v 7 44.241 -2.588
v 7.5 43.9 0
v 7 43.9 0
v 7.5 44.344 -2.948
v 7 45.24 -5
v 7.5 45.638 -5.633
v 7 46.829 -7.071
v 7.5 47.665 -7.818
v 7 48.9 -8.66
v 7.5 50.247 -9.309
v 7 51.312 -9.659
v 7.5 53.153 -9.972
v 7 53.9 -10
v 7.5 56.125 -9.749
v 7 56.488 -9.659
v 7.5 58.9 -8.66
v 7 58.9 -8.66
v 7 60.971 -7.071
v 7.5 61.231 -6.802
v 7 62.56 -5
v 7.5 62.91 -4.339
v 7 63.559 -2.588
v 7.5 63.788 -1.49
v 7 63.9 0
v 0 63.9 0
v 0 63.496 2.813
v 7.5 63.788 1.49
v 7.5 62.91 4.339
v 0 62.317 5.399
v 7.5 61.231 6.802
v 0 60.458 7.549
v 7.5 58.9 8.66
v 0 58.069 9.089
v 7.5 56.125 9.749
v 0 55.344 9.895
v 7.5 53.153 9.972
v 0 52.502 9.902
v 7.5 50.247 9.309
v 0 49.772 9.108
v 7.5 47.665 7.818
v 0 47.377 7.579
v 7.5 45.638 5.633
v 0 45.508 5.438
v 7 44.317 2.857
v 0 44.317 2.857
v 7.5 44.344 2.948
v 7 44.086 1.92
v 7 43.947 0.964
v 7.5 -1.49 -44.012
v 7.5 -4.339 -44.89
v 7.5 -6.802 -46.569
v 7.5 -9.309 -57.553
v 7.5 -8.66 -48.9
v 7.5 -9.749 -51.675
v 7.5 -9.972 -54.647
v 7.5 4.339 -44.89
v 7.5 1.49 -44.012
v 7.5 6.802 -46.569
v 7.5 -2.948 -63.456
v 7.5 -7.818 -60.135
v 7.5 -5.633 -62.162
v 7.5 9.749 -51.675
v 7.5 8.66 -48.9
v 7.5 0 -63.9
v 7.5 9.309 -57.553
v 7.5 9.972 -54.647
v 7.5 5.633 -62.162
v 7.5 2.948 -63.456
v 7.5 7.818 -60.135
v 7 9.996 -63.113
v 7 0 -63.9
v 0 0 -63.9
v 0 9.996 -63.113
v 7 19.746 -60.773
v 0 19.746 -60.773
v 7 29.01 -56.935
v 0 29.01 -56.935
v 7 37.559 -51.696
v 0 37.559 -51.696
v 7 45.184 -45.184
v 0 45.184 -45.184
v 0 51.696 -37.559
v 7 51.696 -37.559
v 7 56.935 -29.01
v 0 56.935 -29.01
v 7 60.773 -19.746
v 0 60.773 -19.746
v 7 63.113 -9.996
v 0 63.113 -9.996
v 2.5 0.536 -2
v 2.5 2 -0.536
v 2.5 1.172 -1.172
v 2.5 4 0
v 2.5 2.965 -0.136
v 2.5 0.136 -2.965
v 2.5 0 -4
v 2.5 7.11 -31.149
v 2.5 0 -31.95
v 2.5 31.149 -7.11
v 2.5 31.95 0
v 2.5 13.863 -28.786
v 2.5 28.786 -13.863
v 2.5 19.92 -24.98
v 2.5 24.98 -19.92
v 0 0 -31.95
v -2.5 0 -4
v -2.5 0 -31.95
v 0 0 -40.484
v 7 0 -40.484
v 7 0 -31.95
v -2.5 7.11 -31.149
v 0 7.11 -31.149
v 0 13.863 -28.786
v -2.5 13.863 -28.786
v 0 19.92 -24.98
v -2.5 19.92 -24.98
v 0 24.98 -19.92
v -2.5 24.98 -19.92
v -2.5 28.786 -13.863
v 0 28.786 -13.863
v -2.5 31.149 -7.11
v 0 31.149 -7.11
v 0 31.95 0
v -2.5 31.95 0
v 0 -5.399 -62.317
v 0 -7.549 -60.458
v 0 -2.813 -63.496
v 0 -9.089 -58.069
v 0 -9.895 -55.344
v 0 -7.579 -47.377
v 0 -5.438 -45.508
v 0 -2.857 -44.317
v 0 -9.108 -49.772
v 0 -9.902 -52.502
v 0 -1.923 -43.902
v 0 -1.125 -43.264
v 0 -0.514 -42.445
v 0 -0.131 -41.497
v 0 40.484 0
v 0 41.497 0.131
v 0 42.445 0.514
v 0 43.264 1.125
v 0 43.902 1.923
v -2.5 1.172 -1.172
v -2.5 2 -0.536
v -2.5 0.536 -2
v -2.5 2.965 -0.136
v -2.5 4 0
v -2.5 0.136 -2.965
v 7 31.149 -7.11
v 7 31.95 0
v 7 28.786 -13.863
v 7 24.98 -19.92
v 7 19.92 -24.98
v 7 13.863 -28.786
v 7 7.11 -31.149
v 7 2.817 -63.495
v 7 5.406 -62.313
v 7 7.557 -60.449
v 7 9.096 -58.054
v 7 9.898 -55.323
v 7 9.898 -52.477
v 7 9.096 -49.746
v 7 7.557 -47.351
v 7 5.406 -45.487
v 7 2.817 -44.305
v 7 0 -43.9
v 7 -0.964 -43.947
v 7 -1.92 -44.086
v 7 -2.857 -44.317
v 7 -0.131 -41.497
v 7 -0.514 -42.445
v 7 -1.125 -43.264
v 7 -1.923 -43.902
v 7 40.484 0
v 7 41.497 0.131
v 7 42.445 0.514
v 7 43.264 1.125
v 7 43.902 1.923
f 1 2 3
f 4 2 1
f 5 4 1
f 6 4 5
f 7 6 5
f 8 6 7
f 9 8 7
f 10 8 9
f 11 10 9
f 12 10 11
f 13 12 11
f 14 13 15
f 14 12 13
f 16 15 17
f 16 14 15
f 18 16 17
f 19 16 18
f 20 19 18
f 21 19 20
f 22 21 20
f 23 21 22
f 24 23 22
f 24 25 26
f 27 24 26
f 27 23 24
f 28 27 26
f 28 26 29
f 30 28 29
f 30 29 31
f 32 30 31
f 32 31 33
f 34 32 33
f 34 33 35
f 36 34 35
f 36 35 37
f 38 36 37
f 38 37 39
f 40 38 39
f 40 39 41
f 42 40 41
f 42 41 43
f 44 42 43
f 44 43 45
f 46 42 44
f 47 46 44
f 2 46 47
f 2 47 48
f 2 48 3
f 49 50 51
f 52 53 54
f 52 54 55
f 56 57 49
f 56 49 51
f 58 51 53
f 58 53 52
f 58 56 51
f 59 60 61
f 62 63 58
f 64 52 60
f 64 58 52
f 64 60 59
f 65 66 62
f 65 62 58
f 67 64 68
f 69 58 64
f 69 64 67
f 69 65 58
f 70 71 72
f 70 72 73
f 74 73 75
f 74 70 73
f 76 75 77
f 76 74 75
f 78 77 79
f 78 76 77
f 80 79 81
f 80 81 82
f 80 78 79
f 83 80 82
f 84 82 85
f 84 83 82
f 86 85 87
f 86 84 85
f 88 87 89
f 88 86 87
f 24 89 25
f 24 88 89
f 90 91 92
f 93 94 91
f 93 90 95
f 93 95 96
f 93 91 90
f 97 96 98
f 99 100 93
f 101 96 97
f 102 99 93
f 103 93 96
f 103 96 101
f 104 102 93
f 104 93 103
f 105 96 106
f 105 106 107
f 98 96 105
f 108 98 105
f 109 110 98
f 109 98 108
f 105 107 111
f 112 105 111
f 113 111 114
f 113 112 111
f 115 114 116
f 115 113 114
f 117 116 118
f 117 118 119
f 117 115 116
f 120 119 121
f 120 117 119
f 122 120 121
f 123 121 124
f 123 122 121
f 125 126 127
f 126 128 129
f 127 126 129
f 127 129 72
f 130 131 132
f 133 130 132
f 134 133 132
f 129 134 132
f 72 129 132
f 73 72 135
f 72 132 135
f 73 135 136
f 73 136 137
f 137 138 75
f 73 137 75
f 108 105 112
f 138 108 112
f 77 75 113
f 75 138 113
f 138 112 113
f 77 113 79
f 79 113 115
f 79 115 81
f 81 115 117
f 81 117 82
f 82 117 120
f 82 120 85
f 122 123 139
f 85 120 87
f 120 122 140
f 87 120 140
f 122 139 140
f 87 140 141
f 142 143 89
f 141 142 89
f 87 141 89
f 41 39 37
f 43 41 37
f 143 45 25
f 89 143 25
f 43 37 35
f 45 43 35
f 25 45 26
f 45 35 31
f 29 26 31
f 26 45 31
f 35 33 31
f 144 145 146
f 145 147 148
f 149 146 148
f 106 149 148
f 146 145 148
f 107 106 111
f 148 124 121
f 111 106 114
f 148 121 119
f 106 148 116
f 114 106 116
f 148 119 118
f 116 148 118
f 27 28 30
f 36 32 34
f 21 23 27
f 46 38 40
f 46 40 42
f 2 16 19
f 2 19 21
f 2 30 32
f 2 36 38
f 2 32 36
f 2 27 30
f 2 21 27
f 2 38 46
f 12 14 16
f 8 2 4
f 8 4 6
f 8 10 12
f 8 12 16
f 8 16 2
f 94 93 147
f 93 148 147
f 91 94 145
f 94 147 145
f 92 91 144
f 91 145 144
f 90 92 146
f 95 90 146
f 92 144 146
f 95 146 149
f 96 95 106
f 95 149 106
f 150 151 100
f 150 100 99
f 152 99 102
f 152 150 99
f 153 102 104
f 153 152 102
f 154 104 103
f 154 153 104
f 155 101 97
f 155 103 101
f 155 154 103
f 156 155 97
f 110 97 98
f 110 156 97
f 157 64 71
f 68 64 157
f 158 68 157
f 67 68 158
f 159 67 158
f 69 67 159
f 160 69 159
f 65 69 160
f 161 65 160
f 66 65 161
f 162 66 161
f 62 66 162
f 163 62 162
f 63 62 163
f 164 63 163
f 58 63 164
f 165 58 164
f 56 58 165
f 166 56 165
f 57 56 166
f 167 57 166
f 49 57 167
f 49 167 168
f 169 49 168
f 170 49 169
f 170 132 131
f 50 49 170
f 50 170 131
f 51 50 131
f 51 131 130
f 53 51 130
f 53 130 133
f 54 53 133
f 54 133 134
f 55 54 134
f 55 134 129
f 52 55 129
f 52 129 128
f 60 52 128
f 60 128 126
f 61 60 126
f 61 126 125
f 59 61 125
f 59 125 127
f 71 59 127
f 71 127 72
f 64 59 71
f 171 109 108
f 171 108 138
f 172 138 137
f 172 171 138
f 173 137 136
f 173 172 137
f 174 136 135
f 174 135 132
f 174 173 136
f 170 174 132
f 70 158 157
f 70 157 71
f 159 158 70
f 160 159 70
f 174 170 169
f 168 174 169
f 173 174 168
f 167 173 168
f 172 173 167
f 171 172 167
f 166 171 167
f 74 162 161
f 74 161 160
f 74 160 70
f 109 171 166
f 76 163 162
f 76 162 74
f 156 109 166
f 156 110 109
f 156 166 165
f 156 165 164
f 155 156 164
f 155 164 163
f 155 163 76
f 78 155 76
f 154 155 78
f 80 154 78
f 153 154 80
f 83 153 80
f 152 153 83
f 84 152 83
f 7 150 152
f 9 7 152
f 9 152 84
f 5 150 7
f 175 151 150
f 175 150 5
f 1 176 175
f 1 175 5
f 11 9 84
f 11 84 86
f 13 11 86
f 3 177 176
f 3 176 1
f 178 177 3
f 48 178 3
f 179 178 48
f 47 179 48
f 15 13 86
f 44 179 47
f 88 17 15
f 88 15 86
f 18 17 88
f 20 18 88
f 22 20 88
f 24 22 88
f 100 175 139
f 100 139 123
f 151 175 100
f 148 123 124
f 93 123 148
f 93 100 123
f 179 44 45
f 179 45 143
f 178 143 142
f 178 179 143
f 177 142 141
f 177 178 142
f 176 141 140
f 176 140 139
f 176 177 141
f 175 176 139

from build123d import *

# Parameters (mm, degrees)
SALIENTE_EXTRUIR1_DEPTH = 2.5
SALIENTE_EXTRUIR2_START = 7
SALIENTE_EXTRUIR2_DEPTH = 7
SALIENTE_EXTRUIR3_START = 7.5
CROQUIS2_4_R            = 10
SALIENTE_EXTRUIR3_DEPTH = 7.5
REDONDEO1_R             = 4
REDONDEO2_R             = 4


with BuildPart() as part:
    # Croquis2 → Saliente-Extruir1 (new, symmetric)
    with BuildSketch(Plane(origin=(0, 0, 0), x_dir=(0, 0, -1), z_dir=(1, 0, 0))):
        with BuildLine():
            ThreePointArc((31.95, 0), (22.592061659, 22.592061659), (0, 31.95))
            Line((0, 31.95), (0, 0))
            Line((0, 0), (31.95, 0))
        make_face()
    extrude(amount=SALIENTE_EXTRUIR1_DEPTH, both=True)

    # Croquis2<3> → Saliente-Extruir2 (add)
    with BuildSketch(Plane(origin=(0, 0, 0), x_dir=(0, 0, -1), z_dir=(1, 0, 0)).offset(SALIENTE_EXTRUIR2_START)):
        with BuildLine():
            ThreePointArc((10, 53.9), (7.071067812, 46.828932188), (0, 43.9))
            Line((0, 43.9), (0, 31.95))
            ThreePointArc((0, 31.95), (22.592061659, 22.592061659), (31.95, 0))
            Line((31.95, 0), (43.9, 0))
            ThreePointArc((43.9, 0), (53.9, 10), (63.9, 0))
            ThreePointArc((63.9, 0), (45.184123318, 45.184123318), (0, 63.9))
            ThreePointArc((0, 63.9), (7.071067812, 60.971067812), (10, 53.9))
        make_face()
    extrude(amount=-SALIENTE_EXTRUIR2_DEPTH)

    # Croquis2<4> → Saliente-Extruir3 (add)
    with BuildSketch(Plane(origin=(0, 0, 0), x_dir=(0, 0, -1), z_dir=(1, 0, 0)).offset(SALIENTE_EXTRUIR3_START)):
        with Locations((0, 53.9)):
            Circle(CROQUIS2_4_R)
        with Locations((53.9, 0)):
            Circle(CROQUIS2_4_R)
    extrude(amount=-SALIENTE_EXTRUIR3_DEPTH)

    # Redondeo1
    redondeo1_edges = [part.edges().sort_by_distance(p)[0] for p in [
        (0, 0, 0),
    ]]
    fillet(redondeo1_edges, radius=REDONDEO1_R)

    # Redondeo2
    redondeo2_edges = [part.edges().sort_by_distance(p)[0] for p in [
        (3.5, 0, -43.9),
        (3.5, 43.9, 0),
    ]]
    fillet(redondeo2_edges, radius=REDONDEO2_R)


solid = part.part
